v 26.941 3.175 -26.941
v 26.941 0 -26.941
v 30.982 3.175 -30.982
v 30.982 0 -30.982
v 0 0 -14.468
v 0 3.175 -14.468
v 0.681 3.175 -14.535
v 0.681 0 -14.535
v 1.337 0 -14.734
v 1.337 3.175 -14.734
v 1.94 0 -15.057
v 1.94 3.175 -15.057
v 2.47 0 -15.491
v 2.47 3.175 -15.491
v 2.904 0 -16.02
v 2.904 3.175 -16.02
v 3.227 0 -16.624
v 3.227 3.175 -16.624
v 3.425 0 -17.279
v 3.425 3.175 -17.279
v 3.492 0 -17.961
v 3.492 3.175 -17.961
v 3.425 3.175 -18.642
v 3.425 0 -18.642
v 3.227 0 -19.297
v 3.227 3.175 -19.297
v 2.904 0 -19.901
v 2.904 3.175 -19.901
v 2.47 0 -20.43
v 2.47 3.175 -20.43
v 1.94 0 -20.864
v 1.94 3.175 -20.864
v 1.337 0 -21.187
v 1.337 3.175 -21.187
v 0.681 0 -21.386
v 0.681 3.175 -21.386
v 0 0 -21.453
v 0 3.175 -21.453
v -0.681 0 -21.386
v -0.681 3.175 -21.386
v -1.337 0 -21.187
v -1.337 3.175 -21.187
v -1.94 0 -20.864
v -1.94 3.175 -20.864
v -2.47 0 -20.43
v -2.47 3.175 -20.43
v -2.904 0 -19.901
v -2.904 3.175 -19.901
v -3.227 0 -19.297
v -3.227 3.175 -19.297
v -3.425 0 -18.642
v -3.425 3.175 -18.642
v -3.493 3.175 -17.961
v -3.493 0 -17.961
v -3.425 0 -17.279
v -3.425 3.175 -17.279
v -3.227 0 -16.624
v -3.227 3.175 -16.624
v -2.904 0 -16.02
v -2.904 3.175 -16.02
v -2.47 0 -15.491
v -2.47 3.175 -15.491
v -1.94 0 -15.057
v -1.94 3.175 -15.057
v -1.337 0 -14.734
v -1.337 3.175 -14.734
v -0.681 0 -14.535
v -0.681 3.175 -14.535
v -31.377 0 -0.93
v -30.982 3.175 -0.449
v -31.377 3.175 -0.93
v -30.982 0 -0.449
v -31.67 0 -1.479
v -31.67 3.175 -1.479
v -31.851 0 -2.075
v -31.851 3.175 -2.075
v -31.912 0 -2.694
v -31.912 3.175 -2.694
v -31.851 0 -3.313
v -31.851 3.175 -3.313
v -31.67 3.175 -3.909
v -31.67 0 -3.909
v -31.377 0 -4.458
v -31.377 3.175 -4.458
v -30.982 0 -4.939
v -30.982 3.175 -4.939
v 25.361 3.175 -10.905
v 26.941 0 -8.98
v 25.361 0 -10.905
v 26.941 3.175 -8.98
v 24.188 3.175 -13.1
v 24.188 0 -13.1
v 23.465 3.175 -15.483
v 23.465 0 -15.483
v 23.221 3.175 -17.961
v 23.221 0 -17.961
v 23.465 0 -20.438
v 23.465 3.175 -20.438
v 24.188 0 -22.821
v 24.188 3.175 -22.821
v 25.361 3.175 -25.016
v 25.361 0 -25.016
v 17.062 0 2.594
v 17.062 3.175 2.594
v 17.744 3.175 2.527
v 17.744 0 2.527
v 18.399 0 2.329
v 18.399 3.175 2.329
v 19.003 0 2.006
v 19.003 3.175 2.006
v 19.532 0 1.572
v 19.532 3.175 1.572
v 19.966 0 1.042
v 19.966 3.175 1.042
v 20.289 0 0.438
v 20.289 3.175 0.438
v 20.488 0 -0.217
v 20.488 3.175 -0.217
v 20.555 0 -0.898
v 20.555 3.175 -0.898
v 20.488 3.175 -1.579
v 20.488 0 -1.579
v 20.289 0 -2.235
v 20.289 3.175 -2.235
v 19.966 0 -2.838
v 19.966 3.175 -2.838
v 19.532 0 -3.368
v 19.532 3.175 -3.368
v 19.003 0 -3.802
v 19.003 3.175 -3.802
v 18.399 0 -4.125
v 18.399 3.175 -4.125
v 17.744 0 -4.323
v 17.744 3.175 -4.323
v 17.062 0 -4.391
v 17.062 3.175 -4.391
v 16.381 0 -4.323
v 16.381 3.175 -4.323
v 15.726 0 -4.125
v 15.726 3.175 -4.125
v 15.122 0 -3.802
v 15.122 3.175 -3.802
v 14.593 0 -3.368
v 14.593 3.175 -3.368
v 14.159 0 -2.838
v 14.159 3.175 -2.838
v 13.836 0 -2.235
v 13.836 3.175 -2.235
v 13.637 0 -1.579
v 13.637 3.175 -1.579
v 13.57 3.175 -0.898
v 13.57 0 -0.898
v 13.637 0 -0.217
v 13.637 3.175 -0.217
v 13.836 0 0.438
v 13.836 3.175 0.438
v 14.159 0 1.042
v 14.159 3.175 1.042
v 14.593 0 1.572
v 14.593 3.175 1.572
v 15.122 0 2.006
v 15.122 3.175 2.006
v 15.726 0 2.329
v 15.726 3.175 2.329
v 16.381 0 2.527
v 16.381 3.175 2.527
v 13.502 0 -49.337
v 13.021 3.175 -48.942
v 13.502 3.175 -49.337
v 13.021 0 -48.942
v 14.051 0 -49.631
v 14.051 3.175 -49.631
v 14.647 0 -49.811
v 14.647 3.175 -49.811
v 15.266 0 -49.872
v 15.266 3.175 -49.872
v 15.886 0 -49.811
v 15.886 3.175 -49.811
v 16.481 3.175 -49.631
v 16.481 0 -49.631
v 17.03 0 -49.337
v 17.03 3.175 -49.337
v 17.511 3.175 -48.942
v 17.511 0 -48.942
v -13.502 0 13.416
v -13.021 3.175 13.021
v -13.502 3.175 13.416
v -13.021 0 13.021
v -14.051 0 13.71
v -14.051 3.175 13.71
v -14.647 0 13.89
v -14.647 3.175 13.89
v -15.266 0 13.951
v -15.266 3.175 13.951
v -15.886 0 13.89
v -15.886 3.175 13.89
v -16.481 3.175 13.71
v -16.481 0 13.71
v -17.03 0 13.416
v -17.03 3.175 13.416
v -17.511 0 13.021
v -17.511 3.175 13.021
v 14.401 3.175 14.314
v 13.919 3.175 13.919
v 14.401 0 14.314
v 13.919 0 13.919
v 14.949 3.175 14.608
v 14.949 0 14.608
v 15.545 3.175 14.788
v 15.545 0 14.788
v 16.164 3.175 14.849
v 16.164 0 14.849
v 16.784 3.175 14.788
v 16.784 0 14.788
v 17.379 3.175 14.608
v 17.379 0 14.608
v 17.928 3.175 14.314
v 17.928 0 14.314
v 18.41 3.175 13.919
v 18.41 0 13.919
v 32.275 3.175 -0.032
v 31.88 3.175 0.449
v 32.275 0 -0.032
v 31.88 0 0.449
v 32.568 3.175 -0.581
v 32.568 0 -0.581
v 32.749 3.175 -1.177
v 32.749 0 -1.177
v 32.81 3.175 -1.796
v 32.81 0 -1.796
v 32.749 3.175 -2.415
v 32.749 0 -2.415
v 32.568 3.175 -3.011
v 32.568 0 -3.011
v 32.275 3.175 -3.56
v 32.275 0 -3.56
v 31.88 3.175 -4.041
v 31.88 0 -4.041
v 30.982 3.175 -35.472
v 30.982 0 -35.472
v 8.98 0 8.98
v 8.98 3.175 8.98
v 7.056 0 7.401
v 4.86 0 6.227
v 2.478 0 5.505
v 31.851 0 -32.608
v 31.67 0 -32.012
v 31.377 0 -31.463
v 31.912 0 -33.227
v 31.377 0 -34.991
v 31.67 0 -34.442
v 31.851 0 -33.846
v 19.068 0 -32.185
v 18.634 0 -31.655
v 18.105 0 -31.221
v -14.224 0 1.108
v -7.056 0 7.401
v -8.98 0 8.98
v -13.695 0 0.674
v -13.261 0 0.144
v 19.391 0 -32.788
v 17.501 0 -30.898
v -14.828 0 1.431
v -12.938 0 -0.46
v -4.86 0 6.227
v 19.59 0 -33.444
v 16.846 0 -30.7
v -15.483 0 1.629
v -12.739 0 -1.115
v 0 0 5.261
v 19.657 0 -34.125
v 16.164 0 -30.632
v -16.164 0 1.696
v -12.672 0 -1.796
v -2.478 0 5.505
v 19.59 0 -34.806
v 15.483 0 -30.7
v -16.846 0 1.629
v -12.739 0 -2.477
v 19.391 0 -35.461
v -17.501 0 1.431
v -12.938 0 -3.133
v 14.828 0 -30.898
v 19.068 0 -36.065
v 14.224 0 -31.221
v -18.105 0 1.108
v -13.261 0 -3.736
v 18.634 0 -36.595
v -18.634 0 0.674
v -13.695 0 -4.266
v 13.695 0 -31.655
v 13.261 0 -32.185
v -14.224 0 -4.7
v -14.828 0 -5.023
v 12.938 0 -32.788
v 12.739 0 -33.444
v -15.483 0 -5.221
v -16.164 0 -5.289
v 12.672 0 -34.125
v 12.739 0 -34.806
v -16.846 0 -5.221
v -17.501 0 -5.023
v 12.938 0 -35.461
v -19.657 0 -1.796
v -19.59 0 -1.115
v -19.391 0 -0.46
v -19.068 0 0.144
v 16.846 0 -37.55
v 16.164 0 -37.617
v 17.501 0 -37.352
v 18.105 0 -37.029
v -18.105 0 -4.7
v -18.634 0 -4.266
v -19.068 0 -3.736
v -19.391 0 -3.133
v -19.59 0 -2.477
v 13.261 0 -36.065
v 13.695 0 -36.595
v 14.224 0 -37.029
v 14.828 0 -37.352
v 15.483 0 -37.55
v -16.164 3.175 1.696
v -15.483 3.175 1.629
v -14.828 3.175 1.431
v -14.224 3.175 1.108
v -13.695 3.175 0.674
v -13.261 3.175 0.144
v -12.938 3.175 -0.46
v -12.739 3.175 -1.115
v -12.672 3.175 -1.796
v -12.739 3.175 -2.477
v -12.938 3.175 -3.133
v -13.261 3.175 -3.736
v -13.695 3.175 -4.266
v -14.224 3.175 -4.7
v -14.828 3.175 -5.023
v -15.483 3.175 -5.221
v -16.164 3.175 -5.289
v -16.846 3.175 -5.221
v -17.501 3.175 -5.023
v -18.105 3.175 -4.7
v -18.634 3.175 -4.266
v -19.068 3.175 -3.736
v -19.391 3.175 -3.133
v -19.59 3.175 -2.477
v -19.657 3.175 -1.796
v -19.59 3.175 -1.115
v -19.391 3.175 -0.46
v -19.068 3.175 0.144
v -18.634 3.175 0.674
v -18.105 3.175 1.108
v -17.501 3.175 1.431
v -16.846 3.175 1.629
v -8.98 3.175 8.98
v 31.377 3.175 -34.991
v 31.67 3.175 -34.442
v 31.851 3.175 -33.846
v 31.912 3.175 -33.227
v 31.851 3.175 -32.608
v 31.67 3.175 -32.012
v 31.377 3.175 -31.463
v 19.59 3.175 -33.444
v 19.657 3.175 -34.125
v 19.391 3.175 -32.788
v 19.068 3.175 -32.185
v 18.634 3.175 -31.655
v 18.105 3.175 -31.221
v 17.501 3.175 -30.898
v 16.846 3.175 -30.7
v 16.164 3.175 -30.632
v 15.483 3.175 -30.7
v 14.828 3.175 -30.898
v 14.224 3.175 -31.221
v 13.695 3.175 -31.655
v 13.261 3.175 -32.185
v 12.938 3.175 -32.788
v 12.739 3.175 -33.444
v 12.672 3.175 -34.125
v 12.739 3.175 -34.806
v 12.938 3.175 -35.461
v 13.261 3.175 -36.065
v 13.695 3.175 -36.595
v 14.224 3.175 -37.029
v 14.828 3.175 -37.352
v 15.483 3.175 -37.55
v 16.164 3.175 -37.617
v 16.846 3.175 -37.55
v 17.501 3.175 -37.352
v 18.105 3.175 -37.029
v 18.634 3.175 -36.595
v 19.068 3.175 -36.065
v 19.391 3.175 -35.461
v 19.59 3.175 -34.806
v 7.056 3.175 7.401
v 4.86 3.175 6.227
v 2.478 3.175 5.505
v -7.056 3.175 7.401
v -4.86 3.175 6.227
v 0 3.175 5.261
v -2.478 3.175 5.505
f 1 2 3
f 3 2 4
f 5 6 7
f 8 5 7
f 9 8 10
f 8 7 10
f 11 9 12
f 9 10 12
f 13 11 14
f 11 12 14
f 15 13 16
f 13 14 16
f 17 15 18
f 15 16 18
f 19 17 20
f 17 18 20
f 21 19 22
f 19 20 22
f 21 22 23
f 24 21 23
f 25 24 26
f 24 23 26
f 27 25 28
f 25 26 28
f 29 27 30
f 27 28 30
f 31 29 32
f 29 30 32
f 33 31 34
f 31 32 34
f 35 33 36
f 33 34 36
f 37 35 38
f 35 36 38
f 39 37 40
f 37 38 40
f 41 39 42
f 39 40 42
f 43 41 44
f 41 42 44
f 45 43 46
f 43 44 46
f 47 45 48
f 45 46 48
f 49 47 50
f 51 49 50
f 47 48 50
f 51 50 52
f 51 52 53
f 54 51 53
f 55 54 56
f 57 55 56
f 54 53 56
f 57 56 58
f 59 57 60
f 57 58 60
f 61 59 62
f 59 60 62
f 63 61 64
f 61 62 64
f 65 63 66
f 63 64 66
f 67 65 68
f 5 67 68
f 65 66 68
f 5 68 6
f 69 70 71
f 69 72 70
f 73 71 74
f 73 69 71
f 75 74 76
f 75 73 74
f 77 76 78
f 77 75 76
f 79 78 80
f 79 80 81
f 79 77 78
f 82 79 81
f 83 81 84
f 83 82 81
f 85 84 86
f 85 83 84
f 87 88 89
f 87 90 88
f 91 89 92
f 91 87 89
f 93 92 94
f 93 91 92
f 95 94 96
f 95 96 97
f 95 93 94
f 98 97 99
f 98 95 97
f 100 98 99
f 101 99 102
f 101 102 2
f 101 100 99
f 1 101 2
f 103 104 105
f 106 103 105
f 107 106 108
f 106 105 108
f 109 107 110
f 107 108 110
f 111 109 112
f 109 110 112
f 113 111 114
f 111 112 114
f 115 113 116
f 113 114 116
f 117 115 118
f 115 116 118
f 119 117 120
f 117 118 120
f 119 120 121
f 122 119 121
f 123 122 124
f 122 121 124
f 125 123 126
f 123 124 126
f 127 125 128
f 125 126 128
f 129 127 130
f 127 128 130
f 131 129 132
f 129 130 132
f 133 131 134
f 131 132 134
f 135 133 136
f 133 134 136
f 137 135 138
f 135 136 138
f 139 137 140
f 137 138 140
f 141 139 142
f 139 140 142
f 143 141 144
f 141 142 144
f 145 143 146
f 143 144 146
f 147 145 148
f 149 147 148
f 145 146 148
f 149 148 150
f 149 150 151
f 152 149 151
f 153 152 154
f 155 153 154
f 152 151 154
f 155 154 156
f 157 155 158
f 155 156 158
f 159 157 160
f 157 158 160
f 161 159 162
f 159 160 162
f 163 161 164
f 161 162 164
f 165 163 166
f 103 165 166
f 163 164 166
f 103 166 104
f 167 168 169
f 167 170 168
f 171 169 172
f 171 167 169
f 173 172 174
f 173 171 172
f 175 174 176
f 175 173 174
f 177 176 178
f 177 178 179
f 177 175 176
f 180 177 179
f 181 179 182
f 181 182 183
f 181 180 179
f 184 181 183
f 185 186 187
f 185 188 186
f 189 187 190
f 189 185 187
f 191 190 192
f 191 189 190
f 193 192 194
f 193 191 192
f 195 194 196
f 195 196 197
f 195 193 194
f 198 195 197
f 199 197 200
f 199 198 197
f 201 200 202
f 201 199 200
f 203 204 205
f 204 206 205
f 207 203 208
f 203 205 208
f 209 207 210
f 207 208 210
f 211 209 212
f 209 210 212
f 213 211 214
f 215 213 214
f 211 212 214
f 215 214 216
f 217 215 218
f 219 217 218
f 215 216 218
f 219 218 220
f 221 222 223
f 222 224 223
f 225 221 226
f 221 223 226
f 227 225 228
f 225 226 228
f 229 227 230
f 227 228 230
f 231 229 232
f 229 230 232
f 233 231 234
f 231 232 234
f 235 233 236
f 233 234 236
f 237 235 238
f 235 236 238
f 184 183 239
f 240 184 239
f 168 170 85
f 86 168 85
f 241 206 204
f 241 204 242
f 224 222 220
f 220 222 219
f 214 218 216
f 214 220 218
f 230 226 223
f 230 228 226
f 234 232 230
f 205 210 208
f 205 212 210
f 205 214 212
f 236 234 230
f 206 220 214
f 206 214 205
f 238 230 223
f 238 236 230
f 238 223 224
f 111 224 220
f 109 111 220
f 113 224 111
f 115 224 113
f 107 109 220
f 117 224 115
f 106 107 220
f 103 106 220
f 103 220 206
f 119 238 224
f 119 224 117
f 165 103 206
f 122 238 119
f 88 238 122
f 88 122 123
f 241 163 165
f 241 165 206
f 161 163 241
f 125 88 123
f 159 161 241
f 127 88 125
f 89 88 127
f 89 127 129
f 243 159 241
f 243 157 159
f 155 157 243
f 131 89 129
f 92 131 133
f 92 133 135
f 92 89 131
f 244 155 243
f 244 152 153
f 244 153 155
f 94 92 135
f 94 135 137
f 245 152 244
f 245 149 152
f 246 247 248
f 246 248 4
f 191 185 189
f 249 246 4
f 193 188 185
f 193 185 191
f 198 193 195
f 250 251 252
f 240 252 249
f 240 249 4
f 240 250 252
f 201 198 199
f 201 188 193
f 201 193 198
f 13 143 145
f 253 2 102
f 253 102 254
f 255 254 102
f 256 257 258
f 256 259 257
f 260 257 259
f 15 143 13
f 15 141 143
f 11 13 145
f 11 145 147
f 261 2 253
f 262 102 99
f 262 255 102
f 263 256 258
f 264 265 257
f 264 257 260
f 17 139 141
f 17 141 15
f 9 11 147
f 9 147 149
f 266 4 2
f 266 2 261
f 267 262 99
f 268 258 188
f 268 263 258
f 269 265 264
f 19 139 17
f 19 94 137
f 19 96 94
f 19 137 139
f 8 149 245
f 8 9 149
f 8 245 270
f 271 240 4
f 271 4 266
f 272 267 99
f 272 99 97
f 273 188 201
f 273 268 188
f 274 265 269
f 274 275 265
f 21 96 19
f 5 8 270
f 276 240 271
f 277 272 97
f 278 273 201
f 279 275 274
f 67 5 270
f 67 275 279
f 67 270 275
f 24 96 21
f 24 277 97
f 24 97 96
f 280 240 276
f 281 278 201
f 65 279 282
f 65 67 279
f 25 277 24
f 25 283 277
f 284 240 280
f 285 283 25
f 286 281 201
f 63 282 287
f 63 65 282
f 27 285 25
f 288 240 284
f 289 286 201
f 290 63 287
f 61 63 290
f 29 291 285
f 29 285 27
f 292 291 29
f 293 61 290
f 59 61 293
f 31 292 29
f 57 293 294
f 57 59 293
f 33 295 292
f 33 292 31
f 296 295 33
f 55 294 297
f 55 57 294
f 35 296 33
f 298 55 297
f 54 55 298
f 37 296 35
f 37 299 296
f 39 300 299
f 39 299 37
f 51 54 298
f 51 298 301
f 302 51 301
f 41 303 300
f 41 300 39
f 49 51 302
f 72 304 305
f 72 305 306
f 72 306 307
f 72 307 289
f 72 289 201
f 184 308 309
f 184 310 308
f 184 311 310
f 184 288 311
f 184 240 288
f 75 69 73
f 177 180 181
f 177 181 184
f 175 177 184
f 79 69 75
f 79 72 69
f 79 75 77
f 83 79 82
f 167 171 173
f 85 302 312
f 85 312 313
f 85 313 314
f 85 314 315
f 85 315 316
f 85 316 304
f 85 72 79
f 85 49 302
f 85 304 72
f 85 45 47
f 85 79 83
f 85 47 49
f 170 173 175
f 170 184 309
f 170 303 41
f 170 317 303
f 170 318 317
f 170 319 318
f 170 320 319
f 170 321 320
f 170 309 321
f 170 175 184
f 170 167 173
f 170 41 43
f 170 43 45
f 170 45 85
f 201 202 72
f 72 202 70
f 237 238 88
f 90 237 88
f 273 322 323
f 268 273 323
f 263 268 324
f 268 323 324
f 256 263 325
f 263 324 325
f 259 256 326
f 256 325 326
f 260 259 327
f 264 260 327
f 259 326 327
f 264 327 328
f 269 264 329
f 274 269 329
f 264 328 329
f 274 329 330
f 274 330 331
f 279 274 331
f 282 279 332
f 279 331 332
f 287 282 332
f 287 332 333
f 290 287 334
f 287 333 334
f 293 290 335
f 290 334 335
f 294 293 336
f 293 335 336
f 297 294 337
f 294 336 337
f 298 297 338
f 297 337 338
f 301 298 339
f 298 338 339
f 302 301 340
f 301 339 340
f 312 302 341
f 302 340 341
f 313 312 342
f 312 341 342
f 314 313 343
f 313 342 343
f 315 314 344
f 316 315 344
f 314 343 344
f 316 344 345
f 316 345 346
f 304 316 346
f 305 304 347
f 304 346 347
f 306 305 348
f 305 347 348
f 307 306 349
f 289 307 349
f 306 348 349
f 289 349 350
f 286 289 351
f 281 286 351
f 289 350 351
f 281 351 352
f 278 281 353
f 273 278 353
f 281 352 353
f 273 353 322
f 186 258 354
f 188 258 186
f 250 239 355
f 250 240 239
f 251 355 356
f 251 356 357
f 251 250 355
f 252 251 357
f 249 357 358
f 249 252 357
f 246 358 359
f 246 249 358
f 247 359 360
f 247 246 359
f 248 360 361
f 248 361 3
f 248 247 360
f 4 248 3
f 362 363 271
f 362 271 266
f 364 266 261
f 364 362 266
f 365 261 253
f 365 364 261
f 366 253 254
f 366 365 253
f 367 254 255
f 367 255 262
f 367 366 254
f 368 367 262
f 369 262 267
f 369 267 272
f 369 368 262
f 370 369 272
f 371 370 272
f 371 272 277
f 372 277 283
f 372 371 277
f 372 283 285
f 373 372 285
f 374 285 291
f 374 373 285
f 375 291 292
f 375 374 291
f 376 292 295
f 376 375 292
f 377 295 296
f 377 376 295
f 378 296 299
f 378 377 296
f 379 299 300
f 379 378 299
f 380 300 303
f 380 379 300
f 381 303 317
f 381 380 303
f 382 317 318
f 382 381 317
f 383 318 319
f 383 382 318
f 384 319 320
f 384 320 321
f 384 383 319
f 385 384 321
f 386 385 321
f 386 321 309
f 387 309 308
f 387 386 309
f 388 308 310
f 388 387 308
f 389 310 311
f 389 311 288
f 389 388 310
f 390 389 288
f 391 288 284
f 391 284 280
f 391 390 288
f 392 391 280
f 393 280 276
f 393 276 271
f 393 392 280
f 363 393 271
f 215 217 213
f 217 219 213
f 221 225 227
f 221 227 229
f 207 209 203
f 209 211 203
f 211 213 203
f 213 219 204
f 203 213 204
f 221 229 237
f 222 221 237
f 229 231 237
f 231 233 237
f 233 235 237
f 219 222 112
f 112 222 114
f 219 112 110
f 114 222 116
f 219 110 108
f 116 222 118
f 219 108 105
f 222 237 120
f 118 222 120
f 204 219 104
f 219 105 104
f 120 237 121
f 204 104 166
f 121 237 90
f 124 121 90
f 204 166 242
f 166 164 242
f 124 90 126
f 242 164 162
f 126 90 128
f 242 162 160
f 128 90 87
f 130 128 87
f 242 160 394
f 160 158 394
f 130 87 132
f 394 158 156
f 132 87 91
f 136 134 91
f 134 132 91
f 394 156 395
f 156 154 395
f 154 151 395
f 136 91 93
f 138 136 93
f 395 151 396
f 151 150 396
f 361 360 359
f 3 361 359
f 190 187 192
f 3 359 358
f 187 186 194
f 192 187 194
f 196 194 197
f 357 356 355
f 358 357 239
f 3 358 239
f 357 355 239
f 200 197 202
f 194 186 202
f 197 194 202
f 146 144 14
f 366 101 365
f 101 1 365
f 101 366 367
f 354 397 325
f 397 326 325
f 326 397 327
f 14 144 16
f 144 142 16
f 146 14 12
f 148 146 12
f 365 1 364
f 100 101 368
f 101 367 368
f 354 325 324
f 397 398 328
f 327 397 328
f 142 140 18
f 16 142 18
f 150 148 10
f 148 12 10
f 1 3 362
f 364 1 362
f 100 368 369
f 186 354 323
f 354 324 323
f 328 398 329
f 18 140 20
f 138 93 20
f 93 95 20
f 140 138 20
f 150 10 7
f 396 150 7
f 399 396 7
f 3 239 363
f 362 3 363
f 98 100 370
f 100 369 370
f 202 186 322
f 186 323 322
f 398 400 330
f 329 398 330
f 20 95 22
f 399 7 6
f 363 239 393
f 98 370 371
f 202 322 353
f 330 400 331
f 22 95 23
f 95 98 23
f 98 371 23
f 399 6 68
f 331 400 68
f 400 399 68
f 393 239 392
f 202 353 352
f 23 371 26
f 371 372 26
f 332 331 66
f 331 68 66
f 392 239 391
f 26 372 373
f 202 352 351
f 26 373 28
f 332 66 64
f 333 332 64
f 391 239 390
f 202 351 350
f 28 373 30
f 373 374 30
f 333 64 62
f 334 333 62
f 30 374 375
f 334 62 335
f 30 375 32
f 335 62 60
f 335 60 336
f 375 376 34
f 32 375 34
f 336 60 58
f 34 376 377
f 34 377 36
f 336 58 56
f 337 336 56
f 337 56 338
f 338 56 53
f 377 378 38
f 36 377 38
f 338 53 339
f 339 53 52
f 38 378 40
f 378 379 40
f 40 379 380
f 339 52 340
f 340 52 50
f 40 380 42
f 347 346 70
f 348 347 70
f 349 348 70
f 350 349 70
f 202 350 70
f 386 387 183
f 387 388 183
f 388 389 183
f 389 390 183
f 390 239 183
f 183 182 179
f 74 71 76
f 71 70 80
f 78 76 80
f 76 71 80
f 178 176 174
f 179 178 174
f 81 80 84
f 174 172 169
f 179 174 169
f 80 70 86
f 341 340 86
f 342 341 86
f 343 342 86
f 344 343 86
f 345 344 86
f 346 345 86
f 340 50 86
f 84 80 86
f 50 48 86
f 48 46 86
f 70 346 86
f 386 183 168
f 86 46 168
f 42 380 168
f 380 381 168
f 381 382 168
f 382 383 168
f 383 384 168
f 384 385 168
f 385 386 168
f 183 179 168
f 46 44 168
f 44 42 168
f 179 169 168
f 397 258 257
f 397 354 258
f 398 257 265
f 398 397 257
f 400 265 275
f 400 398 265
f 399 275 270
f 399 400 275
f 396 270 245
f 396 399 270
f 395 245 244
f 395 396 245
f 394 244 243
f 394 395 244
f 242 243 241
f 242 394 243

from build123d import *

# Parameters (mm, degrees)
BOSS_EXTRUDE1_DEPTH = 3.175
SKETCH2_R           = 3.4925
CUT_EXTRUDE2_DEPTH  = 3.175
LPATTERN5_COUNT     = 3
LPATTERN5_PITCH     = 22.86
SKETCH7_R           = 3.4925
CUT_EXTRUDE3_DEPTH  = 3.175
LPATTERN6_COUNT     = 2
LPATTERN6_PITCH     = 22.86
SKETCH8_R           = 3.4925
CUT_EXTRUDE4_DEPTH  = 85.115331985
FILLET3_R           = 12.7
FILLET4_R           = 3.175


with BuildPart() as part:
    # Sketch1 → Boss-Extrude1 (new body)
    with BuildSketch(Plane(origin=(0, 0, 0), x_dir=(1, 0, 0), z_dir=(0, 1, 0))):
        Polygon((-17.960512242, 17.960512242), (0, 35.921024484), (17.960512242, 17.960512242), (50.289434278, -14.368409794), (32.328922036, -32.328922036), (0, 0), (-31.430896424, -31.430896424), (-49.391408666, -13.470384182), align=None)
    extrude(amount=BOSS_EXTRUDE1_DEPTH)

    # Sketch2 → Cut-Extrude2 (cut)
    with BuildSketch(Plane(origin=(0, 3.175, 0), x_dir=(1, 0, 0), z_dir=(0, 1, 0))):
        with Locations(Location((-32.328922036, -14.368409794, 0), (0, 0, 270))):
            Circle(SKETCH2_R)
    cut_extrude2 = extrude(amount=-CUT_EXTRUDE2_DEPTH, mode=Mode.SUBTRACT)

    # LPattern5: Cut-Extrude2 ×3
    with Locations(*[Vector(0.7071067811865467, 0, -0.7071067811865485) * (i * LPATTERN5_PITCH) for i in range(1, LPATTERN5_COUNT)]):
        add(cut_extrude2, mode=Mode.SUBTRACT)

    # Sketch7 → Cut-Extrude3 (cut)
    with BuildSketch(Plane(origin=(0, 3.175, 0), x_dir=(1, 0, 0), z_dir=(0, 1, 0))):
        with Locations(Location((33.226947648, -15.266435406, 0), (0, 0, 270))):
            Circle(SKETCH7_R)
    cut_extrude3 = extrude(amount=-CUT_EXTRUDE3_DEPTH, mode=Mode.SUBTRACT)

    # LPattern6: Cut-Extrude3 ×2
    with Locations(*[Vector(-0.7071067811865457, 0, -0.7071067811865493) * (i * LPATTERN6_PITCH) for i in range(1, LPATTERN6_COUNT)]):
        add(cut_extrude3, mode=Mode.SUBTRACT)

    # Mirror2: part across plane


with BuildPart() as part_1:
    add(part.part)
    add(part.part.mirror(Plane(origin=(8.980256121, 0, -8.980256121), x_dir=(0.7071067811865464, 0, 0.7071067811865487), z_dir=(-0.7071067811865489, 0, 0.7071067811865462))))

    # Sketch8 → Cut-Extrude4 (cut, through all)
    # profile 1 of 3: a face of its own
    with BuildSketch(Plane(origin=(0, 3.175, 0), x_dir=(1, 0, 0), z_dir=(0, 1, 0))):
        Polygon((-15.266435406, -15.266435406), (-33.226947648, 2.694076836), (-49.391408666, -13.470384182), (-31.430896424, -31.430896424), align=None)
        with Locations((-32.328922036, -14.368409794)):
            Circle(SKETCH8_R, mode=Mode.SUBTRACT)
    # profile 2 of 3: a face of its own
    with BuildSketch(Plane(origin=(0, 3.175, 0), x_dir=(1, 0, 0), z_dir=(0, 1, 0))):
        Polygon((33.226947648, 33.226947648), (49.391408666, 49.391408666), (31.430896424, 67.351920908), (15.266435406, 51.18745989), align=None)
        with Locations((32.328922036, 50.289434278)):
            Circle(SKETCH8_R, mode=Mode.SUBTRACT)
    # profile 3 of 3: a face of its own
    with BuildSketch(Plane(origin=(0, 3.175, 0), x_dir=(1, 0, 0), z_dir=(0, 1, 0))):
        Polygon((50.289434278, -14.368409794), (34.12497326, 1.796051224), (16.164461018, -16.164461018), (32.328922036, -32.328922036), align=None)
        with Locations((33.226947648, -15.266435406)):
            Circle(SKETCH8_R, mode=Mode.SUBTRACT)
    extrude(amount=-CUT_EXTRUDE4_DEPTH, mode=Mode.SUBTRACT)

    # Fillet3
    fillet3_edges = [part_1.edges().sort_by_distance(p)[0] for p in [
        (0, 1.5875, 0),
        (17.960512242, 1.5875, -17.960512242),
    ]]
    fillet(fillet3_edges, radius=FILLET3_R)

    # Fillet4
    fillet4_edges = [part_1.edges().sort_by_distance(p)[0] for p in [
        (-33.226947648, 1.5875, -2.694076836),
        (-15.266435406, 1.5875, 15.266435406),
        (15.266435406, 1.5875, -51.18745989),
        (33.226947648, 1.5875, -33.226947648),
        (16.164461018, 1.5875, 16.164461018),
        (34.12497326, 1.5875, -1.796051224),
    ]]
    fillet(fillet4_edges, radius=FILLET4_R)


solid = part_1.part
